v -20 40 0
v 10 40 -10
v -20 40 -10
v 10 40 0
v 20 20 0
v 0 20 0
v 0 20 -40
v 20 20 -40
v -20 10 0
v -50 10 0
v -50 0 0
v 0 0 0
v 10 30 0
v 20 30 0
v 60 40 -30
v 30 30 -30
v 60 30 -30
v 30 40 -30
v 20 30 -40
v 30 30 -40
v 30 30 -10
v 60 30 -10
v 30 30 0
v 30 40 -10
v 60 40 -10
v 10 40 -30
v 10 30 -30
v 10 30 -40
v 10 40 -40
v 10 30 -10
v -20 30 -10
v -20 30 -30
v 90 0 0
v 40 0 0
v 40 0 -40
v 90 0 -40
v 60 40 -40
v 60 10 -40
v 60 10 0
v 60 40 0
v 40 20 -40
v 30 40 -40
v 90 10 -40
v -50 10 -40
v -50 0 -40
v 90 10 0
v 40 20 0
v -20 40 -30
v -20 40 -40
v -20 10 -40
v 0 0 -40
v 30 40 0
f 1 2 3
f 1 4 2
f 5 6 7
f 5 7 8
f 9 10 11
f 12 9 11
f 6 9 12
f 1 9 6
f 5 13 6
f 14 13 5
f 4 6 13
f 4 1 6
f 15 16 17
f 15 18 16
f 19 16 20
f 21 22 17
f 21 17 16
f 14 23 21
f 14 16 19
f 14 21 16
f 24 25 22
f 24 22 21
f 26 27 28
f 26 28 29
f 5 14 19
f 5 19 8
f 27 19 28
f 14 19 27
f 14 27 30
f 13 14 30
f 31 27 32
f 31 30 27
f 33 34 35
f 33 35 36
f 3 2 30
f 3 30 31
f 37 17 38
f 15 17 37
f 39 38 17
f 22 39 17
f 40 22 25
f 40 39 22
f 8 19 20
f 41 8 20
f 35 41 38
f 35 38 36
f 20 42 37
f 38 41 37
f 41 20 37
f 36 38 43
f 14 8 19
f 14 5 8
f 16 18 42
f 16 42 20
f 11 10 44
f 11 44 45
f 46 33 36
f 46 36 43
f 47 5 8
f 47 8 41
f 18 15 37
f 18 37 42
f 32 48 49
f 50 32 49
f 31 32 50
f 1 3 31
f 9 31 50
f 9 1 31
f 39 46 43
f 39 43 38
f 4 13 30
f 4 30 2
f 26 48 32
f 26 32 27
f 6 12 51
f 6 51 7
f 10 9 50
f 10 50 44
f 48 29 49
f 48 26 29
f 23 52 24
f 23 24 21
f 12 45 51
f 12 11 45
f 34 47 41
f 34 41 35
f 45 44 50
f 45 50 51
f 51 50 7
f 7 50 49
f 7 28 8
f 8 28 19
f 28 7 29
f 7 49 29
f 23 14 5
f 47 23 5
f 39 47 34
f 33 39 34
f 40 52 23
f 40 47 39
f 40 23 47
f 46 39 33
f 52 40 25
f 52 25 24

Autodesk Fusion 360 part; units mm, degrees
sketch "Sketch1" plane through (0, 0, 0) normal (0, 0, 1) x (1, 0, 0)
  line L0 (-50, 0) -> (0, 0)
  line L1 (0, 0) -> (0, 20)
  line L2 (0, 20) -> (20, 20)
  line L3 (20, 20) -> (20, 30)
  line L4 (20, 30) -> (10, 30)
  line L5 (10, 30) -> (10, 40)
  line L6 (10, 40) -> (-20, 40)
  line L7 (-20, 40) -> (-20, 10)
  line L8 (-20, 10) -> (-50, 10)
  line L9 (-50, 10) -> (-50, 0)
extrude "Extrude1" add sketch "Sketch1" against normal blind 40 makes body 1
sketch "Sketch2" plane through (0, 0, 0) normal (0, 1, 0) x (1, 0, 0)
sketch "Sketch3" plane through (0, 40, 0) normal (0, 1, 0) x (-1, 0, 0)
  line L0 (20, 0) -> (-10, 0)
  line L1 (-10, 0) -> (-10, -40)
  line L2 (-10, -40) -> (20, -40)
  line L3 (20, -40) -> (20, 0)
  line L4 (20, -30) -> (-10, -30)
  line L5 (-10, -30) -> (-10, -10)
  line L6 (-10, -10) -> (20, -10)
  line L7 (20, -10) -> (20, -30)
extrude "Extrude2" cut sketch "Sketch3" against normal blind 10 contours L1 L3 L4 L5 L6 L7 bodies 1
mirror "Mirror1" about plane through (20, 20, 0) normal (1, 0, 0) of bodies 1 makes body 2
